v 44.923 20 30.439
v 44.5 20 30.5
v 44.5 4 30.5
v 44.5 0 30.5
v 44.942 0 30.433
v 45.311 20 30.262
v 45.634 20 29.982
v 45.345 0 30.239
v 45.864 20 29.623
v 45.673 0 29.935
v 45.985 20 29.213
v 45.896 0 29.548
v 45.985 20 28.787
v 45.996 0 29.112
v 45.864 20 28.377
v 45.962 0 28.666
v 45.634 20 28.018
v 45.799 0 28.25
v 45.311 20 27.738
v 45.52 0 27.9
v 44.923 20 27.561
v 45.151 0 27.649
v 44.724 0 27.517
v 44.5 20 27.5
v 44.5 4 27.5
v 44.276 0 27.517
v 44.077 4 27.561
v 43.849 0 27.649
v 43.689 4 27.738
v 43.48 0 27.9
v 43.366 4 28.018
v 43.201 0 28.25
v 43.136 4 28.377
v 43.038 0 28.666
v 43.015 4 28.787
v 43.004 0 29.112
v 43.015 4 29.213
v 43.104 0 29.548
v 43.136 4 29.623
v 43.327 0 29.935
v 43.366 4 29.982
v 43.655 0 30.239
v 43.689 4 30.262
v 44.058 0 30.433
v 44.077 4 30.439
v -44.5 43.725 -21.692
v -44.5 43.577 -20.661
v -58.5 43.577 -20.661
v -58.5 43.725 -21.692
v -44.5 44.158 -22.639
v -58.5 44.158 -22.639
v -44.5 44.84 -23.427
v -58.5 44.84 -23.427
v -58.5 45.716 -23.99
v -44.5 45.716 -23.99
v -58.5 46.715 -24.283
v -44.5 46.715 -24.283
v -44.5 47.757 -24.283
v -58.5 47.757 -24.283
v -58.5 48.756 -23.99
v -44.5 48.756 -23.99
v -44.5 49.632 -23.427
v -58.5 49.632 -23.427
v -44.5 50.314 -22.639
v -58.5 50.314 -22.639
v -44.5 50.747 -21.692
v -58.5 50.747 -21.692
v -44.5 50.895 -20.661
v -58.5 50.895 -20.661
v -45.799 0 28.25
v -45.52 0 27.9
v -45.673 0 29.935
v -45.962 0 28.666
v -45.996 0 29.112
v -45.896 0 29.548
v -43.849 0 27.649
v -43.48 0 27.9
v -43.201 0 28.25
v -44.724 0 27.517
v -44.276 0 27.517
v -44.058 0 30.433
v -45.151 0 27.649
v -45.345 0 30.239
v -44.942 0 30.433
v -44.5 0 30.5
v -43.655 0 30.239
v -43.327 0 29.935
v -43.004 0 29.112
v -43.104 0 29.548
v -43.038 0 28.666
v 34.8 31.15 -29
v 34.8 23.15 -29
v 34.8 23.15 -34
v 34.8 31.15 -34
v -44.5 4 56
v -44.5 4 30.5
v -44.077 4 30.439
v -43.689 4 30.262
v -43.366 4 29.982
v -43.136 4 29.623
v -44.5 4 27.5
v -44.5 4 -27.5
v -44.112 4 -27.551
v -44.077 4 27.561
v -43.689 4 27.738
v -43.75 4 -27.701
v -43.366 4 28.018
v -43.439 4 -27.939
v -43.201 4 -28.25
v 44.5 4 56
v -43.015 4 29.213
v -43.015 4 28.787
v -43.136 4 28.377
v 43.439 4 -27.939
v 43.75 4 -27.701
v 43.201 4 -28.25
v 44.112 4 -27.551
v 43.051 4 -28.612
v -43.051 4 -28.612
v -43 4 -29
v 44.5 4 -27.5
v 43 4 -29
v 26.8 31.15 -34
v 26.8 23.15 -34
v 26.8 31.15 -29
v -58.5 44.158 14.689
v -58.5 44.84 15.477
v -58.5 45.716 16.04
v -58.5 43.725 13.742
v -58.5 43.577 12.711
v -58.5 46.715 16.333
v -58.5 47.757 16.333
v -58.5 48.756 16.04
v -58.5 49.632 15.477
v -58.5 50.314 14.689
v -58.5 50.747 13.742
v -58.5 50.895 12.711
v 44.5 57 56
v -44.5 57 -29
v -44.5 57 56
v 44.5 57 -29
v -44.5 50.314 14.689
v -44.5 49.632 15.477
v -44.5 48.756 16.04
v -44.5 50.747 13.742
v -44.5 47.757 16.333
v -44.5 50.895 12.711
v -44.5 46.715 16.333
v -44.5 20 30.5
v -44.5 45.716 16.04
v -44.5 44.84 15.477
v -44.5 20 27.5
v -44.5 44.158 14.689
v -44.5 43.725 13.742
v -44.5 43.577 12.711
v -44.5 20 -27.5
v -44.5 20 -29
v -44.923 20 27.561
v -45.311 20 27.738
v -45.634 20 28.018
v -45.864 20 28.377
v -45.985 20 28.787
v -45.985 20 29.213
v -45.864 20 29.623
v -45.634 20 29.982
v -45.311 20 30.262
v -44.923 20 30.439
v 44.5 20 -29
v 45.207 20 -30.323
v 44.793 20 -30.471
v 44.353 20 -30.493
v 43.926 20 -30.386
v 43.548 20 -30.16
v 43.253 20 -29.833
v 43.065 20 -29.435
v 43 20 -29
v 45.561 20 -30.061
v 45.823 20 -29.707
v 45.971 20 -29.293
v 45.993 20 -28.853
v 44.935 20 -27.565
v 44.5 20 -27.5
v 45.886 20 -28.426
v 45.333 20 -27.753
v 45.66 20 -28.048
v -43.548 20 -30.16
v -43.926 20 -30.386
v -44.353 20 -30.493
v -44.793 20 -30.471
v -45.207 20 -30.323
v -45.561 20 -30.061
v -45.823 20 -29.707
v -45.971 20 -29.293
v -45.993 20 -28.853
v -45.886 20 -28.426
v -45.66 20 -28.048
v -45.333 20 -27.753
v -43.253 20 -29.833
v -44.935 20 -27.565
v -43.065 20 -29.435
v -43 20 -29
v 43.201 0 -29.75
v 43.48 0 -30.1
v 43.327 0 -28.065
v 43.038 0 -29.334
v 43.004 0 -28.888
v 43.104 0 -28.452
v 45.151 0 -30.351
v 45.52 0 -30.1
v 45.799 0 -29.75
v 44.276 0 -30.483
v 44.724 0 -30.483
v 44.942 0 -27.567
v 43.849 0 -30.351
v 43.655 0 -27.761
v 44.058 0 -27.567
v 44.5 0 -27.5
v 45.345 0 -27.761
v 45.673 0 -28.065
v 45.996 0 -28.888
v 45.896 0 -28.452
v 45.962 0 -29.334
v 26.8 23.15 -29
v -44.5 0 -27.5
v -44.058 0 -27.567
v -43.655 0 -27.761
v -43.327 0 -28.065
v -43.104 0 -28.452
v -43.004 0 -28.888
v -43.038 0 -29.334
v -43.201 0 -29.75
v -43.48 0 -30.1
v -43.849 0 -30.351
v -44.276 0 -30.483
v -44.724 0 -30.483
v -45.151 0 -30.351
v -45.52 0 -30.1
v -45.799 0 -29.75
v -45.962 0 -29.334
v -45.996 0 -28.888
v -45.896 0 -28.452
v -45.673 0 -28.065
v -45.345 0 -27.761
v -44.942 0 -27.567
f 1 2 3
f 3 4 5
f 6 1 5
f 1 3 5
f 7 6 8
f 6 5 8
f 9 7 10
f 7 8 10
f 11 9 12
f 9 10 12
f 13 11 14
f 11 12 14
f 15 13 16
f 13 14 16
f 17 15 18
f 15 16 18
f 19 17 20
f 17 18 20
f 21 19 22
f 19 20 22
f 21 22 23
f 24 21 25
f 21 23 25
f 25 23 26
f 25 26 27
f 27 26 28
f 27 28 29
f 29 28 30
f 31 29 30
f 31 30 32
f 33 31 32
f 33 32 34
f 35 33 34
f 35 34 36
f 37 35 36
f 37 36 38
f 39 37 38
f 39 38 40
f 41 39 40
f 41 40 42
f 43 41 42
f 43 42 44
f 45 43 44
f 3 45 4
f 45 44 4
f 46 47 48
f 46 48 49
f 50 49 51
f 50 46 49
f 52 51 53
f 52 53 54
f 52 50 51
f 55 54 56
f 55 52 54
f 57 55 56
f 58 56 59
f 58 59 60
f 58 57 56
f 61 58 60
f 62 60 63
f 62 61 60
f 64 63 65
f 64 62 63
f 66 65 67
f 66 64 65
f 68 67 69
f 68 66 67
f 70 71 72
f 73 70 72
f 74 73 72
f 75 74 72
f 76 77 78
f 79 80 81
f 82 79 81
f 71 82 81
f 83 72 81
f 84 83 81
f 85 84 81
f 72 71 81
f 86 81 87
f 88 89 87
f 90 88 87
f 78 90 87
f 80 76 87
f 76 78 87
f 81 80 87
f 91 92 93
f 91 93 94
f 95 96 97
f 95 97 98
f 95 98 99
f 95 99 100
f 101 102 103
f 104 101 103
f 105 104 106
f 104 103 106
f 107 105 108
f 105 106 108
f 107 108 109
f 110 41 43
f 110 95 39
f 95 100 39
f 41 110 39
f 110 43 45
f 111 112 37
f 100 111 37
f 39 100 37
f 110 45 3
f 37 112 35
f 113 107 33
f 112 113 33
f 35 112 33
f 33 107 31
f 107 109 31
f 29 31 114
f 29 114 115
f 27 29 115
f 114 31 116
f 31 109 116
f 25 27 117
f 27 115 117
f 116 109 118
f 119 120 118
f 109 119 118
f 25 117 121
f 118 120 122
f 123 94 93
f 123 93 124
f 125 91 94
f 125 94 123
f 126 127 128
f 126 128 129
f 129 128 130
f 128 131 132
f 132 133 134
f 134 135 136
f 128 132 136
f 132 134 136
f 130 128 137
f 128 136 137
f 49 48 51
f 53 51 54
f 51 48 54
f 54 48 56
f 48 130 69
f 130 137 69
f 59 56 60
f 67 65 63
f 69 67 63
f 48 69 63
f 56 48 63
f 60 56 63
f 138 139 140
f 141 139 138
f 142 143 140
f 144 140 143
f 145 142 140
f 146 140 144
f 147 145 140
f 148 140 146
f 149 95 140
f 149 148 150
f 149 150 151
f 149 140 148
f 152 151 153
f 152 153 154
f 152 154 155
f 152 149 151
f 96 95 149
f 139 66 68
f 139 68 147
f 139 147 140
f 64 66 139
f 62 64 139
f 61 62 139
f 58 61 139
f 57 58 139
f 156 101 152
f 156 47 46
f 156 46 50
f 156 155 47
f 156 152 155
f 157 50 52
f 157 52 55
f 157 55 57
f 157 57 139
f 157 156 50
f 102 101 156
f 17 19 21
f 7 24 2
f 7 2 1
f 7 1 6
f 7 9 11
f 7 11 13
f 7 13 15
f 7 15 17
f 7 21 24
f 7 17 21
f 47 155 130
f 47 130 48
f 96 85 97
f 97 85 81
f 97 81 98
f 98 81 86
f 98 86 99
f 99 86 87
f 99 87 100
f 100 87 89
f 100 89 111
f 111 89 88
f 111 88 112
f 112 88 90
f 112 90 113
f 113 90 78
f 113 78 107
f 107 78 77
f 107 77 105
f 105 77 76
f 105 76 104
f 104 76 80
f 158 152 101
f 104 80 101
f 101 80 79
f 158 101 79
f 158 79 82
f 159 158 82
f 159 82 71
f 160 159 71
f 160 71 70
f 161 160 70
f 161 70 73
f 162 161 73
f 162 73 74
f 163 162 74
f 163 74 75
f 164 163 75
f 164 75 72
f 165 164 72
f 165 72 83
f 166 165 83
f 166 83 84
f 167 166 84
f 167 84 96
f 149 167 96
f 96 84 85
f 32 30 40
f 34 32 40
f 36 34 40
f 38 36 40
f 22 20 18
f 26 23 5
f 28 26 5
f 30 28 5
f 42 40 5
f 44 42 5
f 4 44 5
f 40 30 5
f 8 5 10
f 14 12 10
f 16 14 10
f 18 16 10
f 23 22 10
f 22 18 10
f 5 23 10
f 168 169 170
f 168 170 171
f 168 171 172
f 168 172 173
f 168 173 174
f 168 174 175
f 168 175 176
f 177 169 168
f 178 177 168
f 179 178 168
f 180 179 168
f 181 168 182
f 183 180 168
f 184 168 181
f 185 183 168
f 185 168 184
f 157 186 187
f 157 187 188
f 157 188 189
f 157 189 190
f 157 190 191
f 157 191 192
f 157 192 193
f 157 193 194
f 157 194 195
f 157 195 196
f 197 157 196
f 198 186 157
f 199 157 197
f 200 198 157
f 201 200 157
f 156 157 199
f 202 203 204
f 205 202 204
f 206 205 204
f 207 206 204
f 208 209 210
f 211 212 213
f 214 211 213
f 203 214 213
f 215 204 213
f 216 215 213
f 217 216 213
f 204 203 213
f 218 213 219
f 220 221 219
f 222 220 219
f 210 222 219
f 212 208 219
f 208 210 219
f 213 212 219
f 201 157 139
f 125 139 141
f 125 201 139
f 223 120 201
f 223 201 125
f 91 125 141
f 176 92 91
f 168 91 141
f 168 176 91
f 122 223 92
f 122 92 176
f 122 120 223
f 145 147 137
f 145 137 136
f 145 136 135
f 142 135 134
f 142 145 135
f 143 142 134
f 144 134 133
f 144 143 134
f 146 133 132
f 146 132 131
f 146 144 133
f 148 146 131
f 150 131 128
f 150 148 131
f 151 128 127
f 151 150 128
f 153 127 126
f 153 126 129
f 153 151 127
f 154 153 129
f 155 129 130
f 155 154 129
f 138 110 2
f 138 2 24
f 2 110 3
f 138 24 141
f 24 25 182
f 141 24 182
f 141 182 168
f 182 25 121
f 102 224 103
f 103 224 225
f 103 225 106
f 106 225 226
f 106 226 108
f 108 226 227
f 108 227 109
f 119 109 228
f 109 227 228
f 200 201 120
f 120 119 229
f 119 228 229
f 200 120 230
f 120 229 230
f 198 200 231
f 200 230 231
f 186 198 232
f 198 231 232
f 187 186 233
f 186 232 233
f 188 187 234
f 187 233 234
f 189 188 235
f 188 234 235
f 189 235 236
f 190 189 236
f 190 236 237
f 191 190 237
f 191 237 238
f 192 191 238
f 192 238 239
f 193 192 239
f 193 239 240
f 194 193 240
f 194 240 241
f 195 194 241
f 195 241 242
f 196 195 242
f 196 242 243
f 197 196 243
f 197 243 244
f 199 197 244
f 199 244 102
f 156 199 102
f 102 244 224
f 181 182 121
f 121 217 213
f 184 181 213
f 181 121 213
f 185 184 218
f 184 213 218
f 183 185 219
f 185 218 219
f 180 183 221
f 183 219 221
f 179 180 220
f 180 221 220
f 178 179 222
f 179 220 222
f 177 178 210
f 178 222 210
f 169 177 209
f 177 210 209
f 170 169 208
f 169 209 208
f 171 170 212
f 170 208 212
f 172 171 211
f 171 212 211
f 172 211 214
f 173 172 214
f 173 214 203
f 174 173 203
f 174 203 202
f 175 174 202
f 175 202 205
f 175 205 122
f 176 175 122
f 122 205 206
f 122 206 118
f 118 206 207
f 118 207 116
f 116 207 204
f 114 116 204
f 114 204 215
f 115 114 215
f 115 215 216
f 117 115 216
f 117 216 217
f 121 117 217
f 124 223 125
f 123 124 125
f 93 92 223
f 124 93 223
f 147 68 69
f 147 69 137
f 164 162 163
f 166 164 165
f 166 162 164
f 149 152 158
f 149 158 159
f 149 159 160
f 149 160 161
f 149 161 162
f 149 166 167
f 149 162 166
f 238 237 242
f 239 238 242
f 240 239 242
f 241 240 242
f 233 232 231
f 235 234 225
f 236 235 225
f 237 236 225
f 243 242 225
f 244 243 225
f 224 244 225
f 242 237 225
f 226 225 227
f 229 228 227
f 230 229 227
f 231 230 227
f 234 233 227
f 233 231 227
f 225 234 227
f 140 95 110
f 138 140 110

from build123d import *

# Parameters (mm, degrees)
SKETCH2_R                = 1.5
BOSS_EXTRUDE1_DEPTH      = 20
BOSS_EXTRUDE1_2_DEPTH    = 20
BOSS_EXTRUDE1_3_DEPTH    = 20
BOSS_EXTRUDE1_4_DEPTH    = 20
BOSS_EXTRUDE2_DEPTH      = 37
BOSS_EXTRUDE2_DEPTH_BACK = 16
SKETCH3_W                = 89
SKETCH3_H                = 85
BOSS_EXTRUDE5_DEPTH      = 14
SKETCH8_W                = 8
SKETCH8_H                = 8
BOSS_EXTRUDE6_DEPTH      = 5


with BuildPart() as part:
    # Sketch2 → Boss-Extrude1 (new body)
    with BuildSketch(Plane(origin=(0, 0, 0), x_dir=(1, 0, 0), z_dir=(0, 1, 0))):
        with Locations(Location((-44.5, 29, 0), (0, 0, 270))):
            Circle(SKETCH2_R)
    extrude(amount=BOSS_EXTRUDE1_DEPTH)



with BuildPart() as body_2:
    # Sketch2 → Boss-Extrude1 2 (new body)
    with BuildSketch(Plane(origin=(0, 0, 0), x_dir=(1, 0, 0), z_dir=(0, 1, 0))):
        with Locations(Location((44.5, 29, 0), (0, 0, 270))):
            Circle(SKETCH2_R)
    extrude(amount=BOSS_EXTRUDE1_2_DEPTH)


with BuildPart() as body_3:
    # Sketch2 → Boss-Extrude1 3 (new body)
    with BuildSketch(Plane(origin=(0, 0, 0), x_dir=(1, 0, 0), z_dir=(0, 1, 0))):
        with Locations(Location((-44.5, -29, 0), (0, 0, 270))):
            Circle(SKETCH2_R)
    extrude(amount=BOSS_EXTRUDE1_3_DEPTH)


with BuildPart() as body_4:
    # Sketch2 → Boss-Extrude1 4 (new body)
    with BuildSketch(Plane(origin=(0, 0, 0), x_dir=(1, 0, 0), z_dir=(0, 1, 0))):
        with Locations(Location((44.5, -29, 0), (0, 0, 270))):
            Circle(SKETCH2_R)
    extrude(amount=BOSS_EXTRUDE1_4_DEPTH)


with BuildPart() as part_1:
    add(part.part)

    add(body_2.part)  # Boss-Extrude2 merges body 2

    add(body_3.part)  # Boss-Extrude2 merges body 3

    add(body_4.part)  # Boss-Extrude2 merges body 4
    # Sketch3 → Boss-Extrude2 (add, two sides: drawn at the far end of the back side and taken through both)
    with BuildSketch(Plane(origin=(0, 20, 0), x_dir=(1, 0, 0), z_dir=(0, 1, 0)).offset(-BOSS_EXTRUDE2_DEPTH_BACK)):
        with Locations((0, -13.5)):
            Rectangle(SKETCH3_W, SKETCH3_H)
    extrude(amount=BOSS_EXTRUDE2_DEPTH + BOSS_EXTRUDE2_DEPTH_BACK)

    # Sketch7 → Boss-Extrude5 (add)
    with BuildSketch(Plane.ZY.offset(44.5)):
        with BuildLine():
            Line((-20.661260067, 50.895180513), (12.711227635, 50.895180513))
            ThreePointArc((12.711227635, 50.895180513), (16.370214945, 47.236193203), (12.711227635, 43.577205894))
            Line((12.711227635, 43.577205894), (-20.661260067, 43.577205894))
            ThreePointArc((-20.661260067, 43.577205894), (-24.320247376, 47.236193203), (-20.661260067, 50.895180513))
        make_face()
    extrude(amount=BOSS_EXTRUDE5_DEPTH)

    # Sketch8 → Boss-Extrude6 (add)
    with BuildSketch(Plane(origin=(0, 0, -29), x_dir=(-1, 0, 0), z_dir=(0, 0, -1))):
        with Locations((-30.8, 27.15)):
            Rectangle(SKETCH8_W, SKETCH8_H)
    extrude(amount=BOSS_EXTRUDE6_DEPTH)


solid = part_1.part
